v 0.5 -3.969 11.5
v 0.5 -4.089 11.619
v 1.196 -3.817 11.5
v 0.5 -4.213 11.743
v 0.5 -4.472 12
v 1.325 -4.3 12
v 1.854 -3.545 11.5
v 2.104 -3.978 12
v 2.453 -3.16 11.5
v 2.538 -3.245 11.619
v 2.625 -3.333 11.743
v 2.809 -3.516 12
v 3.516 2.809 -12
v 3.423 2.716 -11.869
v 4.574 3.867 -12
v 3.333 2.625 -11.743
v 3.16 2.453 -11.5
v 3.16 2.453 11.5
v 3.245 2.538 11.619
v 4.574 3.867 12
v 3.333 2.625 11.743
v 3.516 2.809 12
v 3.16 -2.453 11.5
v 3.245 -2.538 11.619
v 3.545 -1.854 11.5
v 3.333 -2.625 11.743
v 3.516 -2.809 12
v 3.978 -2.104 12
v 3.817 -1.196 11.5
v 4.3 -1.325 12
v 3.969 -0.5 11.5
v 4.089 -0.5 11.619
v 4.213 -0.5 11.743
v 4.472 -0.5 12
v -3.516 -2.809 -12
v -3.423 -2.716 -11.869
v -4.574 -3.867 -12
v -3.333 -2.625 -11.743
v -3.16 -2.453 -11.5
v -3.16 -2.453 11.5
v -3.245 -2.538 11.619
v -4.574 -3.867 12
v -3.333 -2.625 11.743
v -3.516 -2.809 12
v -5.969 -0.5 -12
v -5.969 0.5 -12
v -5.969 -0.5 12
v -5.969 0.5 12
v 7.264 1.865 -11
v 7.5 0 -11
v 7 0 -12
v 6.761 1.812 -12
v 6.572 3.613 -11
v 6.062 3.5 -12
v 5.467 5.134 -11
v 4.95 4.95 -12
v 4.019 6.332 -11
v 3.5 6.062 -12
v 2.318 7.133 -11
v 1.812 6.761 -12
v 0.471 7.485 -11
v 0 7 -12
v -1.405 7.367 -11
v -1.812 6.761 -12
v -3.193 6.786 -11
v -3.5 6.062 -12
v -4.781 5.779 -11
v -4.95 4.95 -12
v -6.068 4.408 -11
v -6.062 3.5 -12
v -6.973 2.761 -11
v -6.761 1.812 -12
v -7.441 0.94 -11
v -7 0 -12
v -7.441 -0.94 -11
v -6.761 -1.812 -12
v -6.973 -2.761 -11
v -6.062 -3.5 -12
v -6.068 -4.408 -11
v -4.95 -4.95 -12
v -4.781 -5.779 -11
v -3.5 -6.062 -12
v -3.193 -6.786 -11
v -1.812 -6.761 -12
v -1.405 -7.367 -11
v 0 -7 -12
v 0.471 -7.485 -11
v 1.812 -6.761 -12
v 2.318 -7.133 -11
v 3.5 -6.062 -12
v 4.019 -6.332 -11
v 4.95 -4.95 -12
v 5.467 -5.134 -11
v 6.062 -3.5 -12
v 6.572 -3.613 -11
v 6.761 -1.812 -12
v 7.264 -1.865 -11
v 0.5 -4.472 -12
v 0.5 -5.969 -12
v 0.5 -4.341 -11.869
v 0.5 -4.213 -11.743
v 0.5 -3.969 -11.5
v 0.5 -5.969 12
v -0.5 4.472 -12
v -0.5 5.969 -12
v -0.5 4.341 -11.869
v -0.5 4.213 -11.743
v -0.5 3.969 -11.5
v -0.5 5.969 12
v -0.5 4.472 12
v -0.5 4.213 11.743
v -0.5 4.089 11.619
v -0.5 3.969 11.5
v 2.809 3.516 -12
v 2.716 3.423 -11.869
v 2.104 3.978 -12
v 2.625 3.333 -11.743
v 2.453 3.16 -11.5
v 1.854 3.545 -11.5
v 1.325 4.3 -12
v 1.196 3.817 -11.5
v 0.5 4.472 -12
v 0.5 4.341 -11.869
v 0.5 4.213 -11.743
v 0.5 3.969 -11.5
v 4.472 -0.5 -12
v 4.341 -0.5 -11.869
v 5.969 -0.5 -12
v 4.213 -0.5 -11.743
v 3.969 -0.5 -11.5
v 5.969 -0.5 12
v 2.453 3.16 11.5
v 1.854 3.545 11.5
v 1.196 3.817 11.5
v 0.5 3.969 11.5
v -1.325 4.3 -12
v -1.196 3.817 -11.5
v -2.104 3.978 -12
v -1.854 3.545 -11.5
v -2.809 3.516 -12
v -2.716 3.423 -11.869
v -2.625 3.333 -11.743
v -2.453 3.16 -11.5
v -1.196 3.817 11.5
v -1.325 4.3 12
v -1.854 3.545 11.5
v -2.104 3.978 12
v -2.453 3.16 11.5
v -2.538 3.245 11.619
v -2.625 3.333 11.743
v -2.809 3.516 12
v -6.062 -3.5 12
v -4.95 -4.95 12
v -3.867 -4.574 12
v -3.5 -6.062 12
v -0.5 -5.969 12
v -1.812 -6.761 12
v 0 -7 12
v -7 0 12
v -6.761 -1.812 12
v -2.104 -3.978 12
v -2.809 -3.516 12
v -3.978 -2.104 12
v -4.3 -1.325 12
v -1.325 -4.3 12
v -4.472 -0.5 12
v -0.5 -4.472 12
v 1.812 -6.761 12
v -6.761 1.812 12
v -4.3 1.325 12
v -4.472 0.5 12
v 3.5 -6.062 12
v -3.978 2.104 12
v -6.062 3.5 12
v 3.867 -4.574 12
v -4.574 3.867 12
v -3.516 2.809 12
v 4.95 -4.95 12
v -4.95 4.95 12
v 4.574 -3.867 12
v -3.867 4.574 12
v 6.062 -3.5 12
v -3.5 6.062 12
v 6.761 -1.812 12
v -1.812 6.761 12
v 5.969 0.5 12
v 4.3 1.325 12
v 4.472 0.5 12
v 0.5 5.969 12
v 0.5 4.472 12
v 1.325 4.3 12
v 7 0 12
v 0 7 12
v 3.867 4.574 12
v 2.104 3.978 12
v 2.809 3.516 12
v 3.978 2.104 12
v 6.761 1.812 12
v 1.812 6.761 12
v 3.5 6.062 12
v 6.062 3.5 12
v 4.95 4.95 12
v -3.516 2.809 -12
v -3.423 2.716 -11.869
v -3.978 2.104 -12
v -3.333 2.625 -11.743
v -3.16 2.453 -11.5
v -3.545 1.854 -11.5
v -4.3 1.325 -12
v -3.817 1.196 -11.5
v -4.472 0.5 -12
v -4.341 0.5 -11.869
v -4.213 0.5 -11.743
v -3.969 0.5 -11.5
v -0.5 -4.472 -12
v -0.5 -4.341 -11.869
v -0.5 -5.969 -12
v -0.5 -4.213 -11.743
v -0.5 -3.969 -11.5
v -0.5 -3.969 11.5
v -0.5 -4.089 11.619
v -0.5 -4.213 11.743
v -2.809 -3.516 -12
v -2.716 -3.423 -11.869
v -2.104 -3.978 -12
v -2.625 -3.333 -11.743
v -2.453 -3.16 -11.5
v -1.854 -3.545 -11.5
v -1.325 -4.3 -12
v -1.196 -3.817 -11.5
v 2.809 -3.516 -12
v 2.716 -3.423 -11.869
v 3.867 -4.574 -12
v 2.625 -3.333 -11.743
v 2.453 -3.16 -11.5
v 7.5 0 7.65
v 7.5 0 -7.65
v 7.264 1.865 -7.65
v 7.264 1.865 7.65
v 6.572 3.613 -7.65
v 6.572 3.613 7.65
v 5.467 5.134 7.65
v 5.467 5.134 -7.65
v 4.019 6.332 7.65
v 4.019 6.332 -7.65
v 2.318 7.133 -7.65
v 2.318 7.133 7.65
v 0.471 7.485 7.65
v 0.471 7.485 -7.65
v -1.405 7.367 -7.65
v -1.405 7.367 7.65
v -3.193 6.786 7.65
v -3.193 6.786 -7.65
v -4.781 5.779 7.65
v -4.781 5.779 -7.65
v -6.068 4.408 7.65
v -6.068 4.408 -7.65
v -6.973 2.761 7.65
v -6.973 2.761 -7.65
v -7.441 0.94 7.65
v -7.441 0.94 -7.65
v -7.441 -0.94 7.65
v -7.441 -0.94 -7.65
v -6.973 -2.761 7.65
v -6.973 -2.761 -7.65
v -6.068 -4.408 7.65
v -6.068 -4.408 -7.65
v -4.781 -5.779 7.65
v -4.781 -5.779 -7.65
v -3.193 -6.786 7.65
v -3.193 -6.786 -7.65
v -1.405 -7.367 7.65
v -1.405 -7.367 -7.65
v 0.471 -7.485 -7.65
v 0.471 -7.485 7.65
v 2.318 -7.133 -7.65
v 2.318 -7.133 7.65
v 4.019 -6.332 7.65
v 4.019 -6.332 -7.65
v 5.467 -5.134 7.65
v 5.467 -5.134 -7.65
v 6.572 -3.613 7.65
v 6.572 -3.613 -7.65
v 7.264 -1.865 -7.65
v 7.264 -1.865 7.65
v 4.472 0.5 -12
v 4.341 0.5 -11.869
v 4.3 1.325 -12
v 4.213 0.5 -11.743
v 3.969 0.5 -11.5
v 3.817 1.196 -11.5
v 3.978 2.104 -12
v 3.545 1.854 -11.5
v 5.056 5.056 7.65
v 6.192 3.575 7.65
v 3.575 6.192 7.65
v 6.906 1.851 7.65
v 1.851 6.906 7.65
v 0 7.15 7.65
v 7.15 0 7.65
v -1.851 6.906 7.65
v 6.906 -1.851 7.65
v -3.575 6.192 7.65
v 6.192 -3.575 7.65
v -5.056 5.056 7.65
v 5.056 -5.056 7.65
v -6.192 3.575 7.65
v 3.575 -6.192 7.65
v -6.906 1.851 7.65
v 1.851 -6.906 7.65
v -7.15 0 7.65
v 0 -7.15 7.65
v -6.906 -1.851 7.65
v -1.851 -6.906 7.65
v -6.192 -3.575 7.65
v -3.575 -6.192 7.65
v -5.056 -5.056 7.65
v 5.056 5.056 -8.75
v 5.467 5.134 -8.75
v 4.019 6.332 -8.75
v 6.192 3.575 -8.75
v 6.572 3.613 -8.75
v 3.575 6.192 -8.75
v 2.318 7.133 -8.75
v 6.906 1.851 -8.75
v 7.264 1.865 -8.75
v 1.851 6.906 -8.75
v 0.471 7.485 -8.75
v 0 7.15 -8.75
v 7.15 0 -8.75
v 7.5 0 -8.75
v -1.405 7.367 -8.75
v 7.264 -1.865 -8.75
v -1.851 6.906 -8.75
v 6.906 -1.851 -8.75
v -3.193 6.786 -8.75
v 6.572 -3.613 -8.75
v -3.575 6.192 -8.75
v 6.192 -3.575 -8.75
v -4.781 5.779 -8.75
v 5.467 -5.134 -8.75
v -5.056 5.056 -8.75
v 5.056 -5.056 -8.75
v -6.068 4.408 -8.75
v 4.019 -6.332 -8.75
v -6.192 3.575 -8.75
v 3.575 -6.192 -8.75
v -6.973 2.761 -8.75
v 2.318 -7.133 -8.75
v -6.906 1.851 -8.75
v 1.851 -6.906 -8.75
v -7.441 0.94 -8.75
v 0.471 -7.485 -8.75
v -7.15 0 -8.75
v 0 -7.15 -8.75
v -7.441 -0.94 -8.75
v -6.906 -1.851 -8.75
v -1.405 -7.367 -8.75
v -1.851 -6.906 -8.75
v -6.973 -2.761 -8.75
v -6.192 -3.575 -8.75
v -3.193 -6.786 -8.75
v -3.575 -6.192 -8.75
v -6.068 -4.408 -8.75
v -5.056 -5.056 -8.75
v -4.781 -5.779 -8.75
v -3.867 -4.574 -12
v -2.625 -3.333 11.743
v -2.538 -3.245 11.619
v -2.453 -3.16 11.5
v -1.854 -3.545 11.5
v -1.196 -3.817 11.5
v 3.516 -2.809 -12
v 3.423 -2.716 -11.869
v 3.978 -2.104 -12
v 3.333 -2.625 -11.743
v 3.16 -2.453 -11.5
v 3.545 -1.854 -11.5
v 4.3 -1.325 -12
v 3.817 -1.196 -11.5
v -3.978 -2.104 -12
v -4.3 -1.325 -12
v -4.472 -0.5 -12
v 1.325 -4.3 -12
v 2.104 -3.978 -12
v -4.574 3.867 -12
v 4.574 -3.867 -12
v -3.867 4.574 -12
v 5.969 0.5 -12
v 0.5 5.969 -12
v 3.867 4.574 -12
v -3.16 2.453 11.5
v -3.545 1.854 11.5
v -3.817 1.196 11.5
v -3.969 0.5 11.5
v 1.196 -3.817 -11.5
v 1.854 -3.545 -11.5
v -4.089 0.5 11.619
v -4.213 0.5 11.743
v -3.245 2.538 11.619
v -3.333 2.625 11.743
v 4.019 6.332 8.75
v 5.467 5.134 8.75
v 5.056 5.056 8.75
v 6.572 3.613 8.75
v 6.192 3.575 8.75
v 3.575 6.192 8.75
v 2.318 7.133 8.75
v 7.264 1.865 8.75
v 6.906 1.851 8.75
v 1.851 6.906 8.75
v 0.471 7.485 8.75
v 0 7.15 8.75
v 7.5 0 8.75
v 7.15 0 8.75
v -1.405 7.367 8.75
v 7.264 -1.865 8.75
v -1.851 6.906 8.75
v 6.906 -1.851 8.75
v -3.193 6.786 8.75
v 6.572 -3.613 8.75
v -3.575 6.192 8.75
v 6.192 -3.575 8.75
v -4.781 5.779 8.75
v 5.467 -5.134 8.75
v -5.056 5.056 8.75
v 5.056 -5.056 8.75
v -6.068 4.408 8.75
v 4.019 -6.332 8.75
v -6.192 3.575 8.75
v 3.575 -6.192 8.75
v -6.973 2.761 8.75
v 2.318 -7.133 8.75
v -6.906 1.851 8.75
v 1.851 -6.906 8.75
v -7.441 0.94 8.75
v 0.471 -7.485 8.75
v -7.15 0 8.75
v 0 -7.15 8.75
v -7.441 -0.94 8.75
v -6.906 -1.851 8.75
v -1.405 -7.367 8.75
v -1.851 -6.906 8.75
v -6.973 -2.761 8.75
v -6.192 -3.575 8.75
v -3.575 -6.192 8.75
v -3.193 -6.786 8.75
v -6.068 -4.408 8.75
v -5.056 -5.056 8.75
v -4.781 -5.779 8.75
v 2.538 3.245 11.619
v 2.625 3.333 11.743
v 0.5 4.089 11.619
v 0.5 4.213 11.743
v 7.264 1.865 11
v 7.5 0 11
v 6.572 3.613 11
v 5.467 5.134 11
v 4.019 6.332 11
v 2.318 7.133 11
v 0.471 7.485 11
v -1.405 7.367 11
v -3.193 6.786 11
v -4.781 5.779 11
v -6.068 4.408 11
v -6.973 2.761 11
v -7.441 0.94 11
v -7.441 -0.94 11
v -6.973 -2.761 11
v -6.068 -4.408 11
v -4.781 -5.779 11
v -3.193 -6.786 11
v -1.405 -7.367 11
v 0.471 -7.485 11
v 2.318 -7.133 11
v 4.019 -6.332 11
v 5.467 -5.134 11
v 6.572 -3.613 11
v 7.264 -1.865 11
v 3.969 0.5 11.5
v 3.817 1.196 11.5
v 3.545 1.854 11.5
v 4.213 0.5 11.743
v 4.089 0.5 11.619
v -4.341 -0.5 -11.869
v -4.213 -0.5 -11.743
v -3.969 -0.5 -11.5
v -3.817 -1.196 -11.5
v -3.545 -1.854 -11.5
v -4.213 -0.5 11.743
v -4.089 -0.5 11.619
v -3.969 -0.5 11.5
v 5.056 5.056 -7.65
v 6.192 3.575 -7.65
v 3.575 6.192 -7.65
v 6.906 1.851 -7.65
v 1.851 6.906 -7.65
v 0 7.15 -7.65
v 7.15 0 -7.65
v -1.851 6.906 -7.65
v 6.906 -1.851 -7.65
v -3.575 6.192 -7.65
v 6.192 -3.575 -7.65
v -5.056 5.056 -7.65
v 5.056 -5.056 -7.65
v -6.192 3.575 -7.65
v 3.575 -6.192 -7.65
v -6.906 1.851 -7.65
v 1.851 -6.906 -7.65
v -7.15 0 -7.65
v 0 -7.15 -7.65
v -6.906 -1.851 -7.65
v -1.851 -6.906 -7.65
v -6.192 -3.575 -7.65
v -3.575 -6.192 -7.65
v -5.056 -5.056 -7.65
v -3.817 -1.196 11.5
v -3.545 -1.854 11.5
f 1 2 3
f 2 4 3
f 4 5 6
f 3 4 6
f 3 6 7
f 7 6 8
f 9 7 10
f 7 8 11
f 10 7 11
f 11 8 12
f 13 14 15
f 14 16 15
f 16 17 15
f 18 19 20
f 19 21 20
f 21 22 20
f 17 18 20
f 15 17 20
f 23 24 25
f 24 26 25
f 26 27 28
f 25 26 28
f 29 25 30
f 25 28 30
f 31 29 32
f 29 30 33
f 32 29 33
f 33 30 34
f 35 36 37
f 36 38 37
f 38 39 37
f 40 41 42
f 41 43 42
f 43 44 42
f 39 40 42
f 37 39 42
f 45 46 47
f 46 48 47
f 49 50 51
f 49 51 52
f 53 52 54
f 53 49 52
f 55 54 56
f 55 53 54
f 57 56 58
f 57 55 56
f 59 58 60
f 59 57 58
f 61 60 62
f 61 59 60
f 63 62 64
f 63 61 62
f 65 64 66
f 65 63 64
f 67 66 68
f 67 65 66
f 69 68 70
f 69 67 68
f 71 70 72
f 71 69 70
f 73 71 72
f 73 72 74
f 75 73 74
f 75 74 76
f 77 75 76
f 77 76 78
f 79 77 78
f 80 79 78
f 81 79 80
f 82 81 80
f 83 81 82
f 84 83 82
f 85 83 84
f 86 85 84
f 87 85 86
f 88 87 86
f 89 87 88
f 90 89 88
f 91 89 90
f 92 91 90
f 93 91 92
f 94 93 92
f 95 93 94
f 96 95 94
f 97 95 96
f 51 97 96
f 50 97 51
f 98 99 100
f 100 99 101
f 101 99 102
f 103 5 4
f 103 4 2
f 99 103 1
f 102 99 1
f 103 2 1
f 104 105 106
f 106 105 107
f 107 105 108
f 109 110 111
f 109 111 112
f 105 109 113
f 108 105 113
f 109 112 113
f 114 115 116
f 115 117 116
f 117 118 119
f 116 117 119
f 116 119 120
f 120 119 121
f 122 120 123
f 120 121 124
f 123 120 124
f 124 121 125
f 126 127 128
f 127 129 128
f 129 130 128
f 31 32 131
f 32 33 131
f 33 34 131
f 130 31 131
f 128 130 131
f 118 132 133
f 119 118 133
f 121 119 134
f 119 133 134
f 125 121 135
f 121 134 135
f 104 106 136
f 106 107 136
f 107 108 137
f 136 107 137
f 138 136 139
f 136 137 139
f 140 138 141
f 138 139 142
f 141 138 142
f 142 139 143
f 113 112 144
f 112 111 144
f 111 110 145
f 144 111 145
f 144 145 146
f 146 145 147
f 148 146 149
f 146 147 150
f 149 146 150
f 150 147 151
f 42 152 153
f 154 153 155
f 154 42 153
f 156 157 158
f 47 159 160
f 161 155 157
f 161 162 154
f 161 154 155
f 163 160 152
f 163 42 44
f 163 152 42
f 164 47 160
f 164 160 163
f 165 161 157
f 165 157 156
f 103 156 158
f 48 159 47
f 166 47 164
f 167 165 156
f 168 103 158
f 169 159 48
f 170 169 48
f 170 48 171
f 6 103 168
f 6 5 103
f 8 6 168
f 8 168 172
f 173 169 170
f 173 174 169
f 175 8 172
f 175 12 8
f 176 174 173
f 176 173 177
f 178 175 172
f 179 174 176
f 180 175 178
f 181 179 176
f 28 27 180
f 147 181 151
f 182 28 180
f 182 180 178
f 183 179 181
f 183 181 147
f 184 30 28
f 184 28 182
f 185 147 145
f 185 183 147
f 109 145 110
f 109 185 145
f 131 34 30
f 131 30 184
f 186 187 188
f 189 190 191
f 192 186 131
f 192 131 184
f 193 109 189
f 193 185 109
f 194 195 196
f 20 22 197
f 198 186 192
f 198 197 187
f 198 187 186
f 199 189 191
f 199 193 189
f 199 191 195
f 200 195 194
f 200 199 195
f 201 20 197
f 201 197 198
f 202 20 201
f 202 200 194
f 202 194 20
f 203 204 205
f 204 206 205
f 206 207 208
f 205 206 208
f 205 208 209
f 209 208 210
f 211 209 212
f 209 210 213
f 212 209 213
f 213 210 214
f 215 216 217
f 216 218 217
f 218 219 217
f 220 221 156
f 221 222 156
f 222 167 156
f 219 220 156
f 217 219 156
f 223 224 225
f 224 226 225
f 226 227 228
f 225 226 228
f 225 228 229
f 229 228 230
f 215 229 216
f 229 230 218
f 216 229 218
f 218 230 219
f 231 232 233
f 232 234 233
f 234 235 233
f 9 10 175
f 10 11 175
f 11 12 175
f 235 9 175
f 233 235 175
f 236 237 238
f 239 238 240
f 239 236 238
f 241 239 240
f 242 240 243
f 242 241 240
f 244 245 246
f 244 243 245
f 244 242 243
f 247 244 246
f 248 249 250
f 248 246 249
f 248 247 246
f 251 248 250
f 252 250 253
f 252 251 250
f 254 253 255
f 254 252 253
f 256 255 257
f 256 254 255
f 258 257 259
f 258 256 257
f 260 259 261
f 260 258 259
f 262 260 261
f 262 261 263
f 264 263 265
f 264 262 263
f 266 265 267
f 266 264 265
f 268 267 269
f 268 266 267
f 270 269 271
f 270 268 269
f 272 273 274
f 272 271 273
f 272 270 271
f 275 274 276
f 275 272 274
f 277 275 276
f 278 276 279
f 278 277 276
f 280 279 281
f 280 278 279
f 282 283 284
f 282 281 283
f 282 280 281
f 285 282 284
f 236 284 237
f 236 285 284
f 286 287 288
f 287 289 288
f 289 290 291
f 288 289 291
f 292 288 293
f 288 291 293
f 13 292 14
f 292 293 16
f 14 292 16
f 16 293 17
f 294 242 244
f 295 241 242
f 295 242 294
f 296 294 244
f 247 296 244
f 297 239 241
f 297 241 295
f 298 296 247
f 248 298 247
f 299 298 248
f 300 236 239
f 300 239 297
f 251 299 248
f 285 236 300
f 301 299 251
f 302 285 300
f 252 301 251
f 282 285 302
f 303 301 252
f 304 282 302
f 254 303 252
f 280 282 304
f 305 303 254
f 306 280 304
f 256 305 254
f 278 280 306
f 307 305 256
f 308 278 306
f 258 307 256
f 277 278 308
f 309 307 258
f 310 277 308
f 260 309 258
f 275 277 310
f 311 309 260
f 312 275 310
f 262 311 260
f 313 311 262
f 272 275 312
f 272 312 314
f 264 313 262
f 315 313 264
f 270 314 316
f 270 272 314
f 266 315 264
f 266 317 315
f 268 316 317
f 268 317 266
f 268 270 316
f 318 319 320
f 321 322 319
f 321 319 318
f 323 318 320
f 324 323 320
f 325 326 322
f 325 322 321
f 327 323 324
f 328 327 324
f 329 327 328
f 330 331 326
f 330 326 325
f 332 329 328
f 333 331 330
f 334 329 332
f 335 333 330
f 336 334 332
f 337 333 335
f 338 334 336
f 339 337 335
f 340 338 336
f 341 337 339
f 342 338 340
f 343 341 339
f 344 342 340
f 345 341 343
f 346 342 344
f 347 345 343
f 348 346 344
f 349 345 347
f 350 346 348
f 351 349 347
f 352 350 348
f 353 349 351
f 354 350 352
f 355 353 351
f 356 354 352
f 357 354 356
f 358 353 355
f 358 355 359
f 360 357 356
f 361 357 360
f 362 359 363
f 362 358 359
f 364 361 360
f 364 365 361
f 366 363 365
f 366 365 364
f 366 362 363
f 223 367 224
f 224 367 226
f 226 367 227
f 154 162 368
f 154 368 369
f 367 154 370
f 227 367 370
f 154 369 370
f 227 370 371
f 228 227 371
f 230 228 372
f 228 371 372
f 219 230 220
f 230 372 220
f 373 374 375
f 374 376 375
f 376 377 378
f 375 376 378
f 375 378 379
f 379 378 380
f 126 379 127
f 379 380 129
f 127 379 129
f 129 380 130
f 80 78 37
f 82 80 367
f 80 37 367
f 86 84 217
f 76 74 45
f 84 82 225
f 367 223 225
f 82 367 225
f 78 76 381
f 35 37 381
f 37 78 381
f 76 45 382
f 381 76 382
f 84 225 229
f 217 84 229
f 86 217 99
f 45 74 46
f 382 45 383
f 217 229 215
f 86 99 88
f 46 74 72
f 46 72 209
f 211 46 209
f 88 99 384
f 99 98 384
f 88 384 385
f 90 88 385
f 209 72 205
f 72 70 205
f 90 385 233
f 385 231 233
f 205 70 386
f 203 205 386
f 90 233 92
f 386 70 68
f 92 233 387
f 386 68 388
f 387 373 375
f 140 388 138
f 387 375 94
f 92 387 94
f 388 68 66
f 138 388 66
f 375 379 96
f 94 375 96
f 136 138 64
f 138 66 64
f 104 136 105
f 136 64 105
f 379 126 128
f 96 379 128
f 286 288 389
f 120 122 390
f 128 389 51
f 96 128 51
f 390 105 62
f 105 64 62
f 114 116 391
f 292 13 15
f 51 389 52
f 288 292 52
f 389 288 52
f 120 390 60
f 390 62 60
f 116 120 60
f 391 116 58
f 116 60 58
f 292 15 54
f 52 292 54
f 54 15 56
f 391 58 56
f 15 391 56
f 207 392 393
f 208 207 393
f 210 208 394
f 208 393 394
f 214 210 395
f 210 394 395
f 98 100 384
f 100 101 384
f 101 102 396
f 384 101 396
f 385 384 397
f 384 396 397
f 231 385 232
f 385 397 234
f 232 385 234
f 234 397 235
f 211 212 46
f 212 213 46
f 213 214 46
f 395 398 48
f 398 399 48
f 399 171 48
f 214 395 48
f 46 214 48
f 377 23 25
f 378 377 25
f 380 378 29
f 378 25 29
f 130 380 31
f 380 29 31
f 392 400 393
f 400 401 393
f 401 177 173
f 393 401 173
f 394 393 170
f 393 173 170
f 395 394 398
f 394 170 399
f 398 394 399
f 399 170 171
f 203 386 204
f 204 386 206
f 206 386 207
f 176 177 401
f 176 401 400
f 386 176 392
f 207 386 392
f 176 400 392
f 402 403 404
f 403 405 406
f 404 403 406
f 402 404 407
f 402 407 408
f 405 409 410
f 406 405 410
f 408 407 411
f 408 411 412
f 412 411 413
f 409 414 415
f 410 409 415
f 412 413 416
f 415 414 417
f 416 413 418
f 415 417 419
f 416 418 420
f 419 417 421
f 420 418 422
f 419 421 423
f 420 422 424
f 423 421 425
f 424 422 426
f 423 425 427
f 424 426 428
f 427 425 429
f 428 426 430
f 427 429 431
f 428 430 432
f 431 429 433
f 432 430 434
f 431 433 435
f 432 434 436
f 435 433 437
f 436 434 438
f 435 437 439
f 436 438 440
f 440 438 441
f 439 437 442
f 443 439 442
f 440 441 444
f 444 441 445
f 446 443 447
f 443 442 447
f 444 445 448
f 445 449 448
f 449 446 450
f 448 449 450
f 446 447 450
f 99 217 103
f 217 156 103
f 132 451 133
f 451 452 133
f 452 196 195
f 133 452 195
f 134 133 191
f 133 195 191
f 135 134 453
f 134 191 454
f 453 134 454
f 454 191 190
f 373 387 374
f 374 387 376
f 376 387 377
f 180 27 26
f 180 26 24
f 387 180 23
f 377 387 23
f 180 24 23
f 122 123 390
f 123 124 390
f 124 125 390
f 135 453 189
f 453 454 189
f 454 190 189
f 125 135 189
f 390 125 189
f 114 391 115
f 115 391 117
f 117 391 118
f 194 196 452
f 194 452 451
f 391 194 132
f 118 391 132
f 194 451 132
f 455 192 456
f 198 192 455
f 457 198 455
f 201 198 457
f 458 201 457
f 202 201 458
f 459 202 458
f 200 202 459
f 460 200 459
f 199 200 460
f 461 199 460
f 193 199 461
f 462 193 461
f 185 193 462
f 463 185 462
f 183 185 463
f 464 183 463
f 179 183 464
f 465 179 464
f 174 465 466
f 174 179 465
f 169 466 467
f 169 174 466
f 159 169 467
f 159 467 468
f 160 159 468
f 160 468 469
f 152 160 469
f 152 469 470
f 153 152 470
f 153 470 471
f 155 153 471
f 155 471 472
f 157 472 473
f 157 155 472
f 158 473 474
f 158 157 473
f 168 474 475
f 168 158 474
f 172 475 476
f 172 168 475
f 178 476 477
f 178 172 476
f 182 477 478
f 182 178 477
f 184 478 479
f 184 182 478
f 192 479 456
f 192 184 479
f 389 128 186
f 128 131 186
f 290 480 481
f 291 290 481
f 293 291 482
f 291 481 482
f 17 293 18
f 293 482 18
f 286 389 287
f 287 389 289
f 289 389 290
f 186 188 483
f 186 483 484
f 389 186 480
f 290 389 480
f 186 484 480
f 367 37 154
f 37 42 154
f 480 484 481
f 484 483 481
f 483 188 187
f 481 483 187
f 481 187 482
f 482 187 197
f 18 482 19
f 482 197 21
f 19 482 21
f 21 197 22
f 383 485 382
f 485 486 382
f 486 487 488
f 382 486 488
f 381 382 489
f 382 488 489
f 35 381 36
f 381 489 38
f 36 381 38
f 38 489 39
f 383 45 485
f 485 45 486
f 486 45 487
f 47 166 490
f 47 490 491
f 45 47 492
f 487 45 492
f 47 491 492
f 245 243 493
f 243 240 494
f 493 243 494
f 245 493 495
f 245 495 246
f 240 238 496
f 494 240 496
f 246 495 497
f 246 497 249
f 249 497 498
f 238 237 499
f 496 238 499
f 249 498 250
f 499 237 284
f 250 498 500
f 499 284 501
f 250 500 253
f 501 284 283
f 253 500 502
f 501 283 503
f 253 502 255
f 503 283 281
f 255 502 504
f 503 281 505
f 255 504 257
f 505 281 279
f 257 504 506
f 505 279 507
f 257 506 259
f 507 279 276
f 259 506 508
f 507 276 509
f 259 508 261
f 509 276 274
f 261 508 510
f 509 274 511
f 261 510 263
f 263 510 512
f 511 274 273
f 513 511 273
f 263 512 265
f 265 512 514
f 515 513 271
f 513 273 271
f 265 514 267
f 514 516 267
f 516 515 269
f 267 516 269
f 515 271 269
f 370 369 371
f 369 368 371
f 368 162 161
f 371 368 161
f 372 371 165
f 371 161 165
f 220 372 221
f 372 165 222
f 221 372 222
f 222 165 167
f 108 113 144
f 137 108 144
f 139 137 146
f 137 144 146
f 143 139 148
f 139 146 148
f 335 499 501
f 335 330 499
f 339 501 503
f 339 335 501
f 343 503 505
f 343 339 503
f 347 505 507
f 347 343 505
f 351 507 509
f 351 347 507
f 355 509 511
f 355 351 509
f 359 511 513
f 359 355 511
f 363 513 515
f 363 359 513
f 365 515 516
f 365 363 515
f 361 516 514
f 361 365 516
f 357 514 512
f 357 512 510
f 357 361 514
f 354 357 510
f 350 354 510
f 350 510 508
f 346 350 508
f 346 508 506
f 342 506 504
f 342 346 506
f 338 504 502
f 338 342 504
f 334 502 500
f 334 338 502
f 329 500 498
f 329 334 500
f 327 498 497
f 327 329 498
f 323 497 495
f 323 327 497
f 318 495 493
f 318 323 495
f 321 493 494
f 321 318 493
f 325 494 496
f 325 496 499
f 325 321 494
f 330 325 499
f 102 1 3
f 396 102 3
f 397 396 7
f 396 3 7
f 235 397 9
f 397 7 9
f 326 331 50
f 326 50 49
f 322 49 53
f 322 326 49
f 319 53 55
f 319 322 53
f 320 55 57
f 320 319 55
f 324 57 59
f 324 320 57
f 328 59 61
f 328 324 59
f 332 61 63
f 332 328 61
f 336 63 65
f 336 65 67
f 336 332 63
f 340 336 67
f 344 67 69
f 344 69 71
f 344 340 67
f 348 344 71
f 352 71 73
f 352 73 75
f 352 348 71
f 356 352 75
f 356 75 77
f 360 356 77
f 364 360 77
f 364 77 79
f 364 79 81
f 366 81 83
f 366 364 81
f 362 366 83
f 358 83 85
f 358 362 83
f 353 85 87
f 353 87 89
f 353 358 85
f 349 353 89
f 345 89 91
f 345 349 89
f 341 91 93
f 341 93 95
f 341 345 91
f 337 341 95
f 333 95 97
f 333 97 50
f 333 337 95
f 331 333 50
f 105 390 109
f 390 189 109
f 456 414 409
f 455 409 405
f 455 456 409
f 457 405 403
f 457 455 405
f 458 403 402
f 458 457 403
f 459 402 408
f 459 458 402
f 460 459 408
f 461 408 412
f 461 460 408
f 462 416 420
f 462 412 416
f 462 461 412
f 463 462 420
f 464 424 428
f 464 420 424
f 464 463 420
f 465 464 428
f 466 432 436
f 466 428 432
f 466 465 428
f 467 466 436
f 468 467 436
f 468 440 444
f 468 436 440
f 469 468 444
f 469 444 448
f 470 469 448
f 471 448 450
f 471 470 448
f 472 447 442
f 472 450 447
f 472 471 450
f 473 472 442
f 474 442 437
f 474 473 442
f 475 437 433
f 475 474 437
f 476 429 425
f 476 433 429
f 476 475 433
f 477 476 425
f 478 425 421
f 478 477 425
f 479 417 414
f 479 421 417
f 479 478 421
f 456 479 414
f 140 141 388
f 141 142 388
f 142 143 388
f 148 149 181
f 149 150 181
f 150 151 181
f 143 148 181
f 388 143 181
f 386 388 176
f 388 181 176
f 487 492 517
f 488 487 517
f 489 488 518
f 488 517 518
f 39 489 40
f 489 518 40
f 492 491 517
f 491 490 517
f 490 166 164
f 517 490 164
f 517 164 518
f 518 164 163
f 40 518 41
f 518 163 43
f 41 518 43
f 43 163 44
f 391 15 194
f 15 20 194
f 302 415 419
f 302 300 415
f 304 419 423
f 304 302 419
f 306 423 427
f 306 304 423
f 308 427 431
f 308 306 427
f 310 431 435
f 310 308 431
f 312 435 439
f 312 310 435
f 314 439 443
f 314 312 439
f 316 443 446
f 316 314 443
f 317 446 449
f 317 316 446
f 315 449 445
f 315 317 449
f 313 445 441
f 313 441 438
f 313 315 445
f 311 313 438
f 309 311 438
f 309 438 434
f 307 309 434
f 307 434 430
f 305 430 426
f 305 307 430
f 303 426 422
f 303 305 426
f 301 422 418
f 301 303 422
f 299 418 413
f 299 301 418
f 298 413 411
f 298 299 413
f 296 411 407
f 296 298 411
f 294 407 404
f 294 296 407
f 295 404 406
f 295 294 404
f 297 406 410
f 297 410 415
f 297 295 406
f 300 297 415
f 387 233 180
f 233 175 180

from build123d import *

# Parameters (mm, degrees)
ESQUISSE1_R        = 7.5
BOSS_EXTRU_1_DEPTH = 12
ESQUISSE2_W        = 1.1
ESQUISSE2_H        = 0.35
CHANFREIN1_SIZE    = 1
CHANFREIN1_SIZE2   = 0.5
CHANFREIN2_SIZE    = 0.5
CHANFREIN2_SIZE2   = 1
CHANFREIN3_SIZE    = 0.5


with BuildPart() as part:
    # Esquisse1 → Boss.-Extru.1 (new, symmetric)
    with BuildSketch(Plane.XY):
        Circle(ESQUISSE1_R)
        with BuildLine():
            Line((3.866903212, 4.574009993), (2.452689649, 3.159796431))
            ThreePointArc((2.452689649, 3.159796431), (1.530733729, 3.69551813), (0.5, 3.968626967))
            Line((0.5, 3.968626967), (0.5, 5.968626967))
            Line((0.5, 5.968626967), (-0.5, 5.968626967))
            Line((-0.5, 5.968626967), (-0.5, 3.968626967))
            ThreePointArc((-0.5, 3.968626967), (-1.530733729, 3.69551813), (-2.452689649, 3.159796431))
            Line((-2.452689649, 3.159796431), (-3.866903212, 4.574009993))
            Line((-3.866903212, 4.574009993), (-4.574009993, 3.866903212))
            Line((-4.574009993, 3.866903212), (-3.159796431, 2.452689649))
            ThreePointArc((-3.159796431, 2.452689649), (-3.69551813, 1.530733729), (-3.968626967, 0.5))
            Line((-3.968626967, 0.5), (-5.968626967, 0.5))
            Line((-5.968626967, 0.5), (-5.968626967, -0.5))
            Line((-5.968626967, -0.5), (-3.968626967, -0.5))
            ThreePointArc((-3.968626967, -0.5), (-3.69551813, -1.530733729), (-3.159796431, -2.452689649))
            Line((-3.159796431, -2.452689649), (-4.574009993, -3.866903212))
            Line((-4.574009993, -3.866903212), (-3.866903212, -4.574009993))
            Line((-3.866903212, -4.574009993), (-2.452689649, -3.159796431))
            ThreePointArc((-2.452689649, -3.159796431), (-1.530733729, -3.69551813), (-0.5, -3.968626967))
            Line((-0.5, -3.968626967), (-0.5, -5.968626967))
            Line((-0.5, -5.968626967), (0.5, -5.968626967))
            Line((0.5, -5.968626967), (0.5, -3.968626967))
            ThreePointArc((0.5, -3.968626967), (1.530733729, -3.69551813), (2.452689649, -3.159796431))
            Line((2.452689649, -3.159796431), (3.866903212, -4.574009993))
            Line((3.866903212, -4.574009993), (4.574009993, -3.866903212))
            Line((4.574009993, -3.866903212), (3.159796431, -2.452689649))
            ThreePointArc((3.159796431, -2.452689649), (3.69551813, -1.530733729), (3.968626967, -0.5))
            Line((3.968626967, -0.5), (5.968626967, -0.5))
            Line((5.968626967, -0.5), (5.968626967, 0.5))
            Line((5.968626967, 0.5), (3.968626967, 0.5))
            ThreePointArc((3.968626967, 0.5), (3.69551813, 1.530733729), (3.159796431, 2.452689649))
            Line((3.159796431, 2.452689649), (4.574009993, 3.866903212))
            Line((4.574009993, 3.866903212), (3.866903212, 4.574009993))
        make_face(mode=Mode.SUBTRACT)
    extrude(amount=BOSS_EXTRU_1_DEPTH, both=True)

    # Esquisse2 → Enlèvement de matière-Révolution1 (revolve, cut)
    with BuildSketch(Plane(origin=(0, 0, 0), x_dir=(0, 0, -1), z_dir=(1, 0, 0)), mode=Mode.PRIVATE) as enl_vement_de_mati_re_r_volution1_sk:
        with Locations((-8.2, 7.325)):
            Rectangle(ESQUISSE2_W, ESQUISSE2_H)
        with Locations((8.2, 7.325)):
            Rectangle(ESQUISSE2_W, ESQUISSE2_H)
    revolve(enl_vement_de_mati_re_r_volution1_sk.sketch.rotate(Axis((0, 0, 12), (0, 0, -1)), 90), axis=Axis((0, 0, 12), (0, 0, -1)), mode=Mode.SUBTRACT)

    # Chanfrein1
    chanfrein1_edges = [part.edges().sort_by_distance(p)[0] for p in [
        (-7.5, 0, 12),
    ]]
    chanfrein1_side = [part.faces().sort_by_distance(p)[0] for p in [
        (-7.5, 0, 10.375),
    ]]
    chamfer(chanfrein1_edges, length=CHANFREIN1_SIZE, length2=CHANFREIN1_SIZE2, reference=chanfrein1_side[0])

    # Chanfrein2
    chanfrein2_edges = [part.edges().sort_by_distance(p)[0] for p in [
        (-7.5, 0, -12),
    ]]
    chanfrein2_side = [part.faces().sort_by_distance(p)[0] for p in [
        (-7.287867966, 0, -12),
    ]]
    chamfer(chanfrein2_edges, length=CHANFREIN2_SIZE, length2=CHANFREIN2_SIZE2, reference=chanfrein2_side[0])

    # Chanfrein3
    chanfrein3_edges = [part.edges().sort_by_distance(p)[0] for p in [
        (-1.530733729, 3.69551813, -12),
        (-3.69551813, 1.530733729, -12),
        (-3.69551813, -1.530733729, -12),
        (-1.530733729, -3.69551813, -12),
        (1.530733729, -3.69551813, -12),
        (3.69551813, -1.530733729, -12),
        (3.69551813, 1.530733729, -12),
        (1.530733729, 3.69551813, -12),
        (-1.530733729, 3.69551813, 12),
        (-3.69551813, 1.530733729, 12),
        (-3.69551813, -1.530733729, 12),
        (-1.530733729, -3.69551813, 12),
        (1.530733729, -3.69551813, 12),
        (3.69551813, -1.530733729, 12),
        (3.69551813, 1.530733729, 12),
        (1.530733729, 3.69551813, 12),
    ]]
    chamfer(chanfrein3_edges, length=CHANFREIN3_SIZE)


solid = part.part
